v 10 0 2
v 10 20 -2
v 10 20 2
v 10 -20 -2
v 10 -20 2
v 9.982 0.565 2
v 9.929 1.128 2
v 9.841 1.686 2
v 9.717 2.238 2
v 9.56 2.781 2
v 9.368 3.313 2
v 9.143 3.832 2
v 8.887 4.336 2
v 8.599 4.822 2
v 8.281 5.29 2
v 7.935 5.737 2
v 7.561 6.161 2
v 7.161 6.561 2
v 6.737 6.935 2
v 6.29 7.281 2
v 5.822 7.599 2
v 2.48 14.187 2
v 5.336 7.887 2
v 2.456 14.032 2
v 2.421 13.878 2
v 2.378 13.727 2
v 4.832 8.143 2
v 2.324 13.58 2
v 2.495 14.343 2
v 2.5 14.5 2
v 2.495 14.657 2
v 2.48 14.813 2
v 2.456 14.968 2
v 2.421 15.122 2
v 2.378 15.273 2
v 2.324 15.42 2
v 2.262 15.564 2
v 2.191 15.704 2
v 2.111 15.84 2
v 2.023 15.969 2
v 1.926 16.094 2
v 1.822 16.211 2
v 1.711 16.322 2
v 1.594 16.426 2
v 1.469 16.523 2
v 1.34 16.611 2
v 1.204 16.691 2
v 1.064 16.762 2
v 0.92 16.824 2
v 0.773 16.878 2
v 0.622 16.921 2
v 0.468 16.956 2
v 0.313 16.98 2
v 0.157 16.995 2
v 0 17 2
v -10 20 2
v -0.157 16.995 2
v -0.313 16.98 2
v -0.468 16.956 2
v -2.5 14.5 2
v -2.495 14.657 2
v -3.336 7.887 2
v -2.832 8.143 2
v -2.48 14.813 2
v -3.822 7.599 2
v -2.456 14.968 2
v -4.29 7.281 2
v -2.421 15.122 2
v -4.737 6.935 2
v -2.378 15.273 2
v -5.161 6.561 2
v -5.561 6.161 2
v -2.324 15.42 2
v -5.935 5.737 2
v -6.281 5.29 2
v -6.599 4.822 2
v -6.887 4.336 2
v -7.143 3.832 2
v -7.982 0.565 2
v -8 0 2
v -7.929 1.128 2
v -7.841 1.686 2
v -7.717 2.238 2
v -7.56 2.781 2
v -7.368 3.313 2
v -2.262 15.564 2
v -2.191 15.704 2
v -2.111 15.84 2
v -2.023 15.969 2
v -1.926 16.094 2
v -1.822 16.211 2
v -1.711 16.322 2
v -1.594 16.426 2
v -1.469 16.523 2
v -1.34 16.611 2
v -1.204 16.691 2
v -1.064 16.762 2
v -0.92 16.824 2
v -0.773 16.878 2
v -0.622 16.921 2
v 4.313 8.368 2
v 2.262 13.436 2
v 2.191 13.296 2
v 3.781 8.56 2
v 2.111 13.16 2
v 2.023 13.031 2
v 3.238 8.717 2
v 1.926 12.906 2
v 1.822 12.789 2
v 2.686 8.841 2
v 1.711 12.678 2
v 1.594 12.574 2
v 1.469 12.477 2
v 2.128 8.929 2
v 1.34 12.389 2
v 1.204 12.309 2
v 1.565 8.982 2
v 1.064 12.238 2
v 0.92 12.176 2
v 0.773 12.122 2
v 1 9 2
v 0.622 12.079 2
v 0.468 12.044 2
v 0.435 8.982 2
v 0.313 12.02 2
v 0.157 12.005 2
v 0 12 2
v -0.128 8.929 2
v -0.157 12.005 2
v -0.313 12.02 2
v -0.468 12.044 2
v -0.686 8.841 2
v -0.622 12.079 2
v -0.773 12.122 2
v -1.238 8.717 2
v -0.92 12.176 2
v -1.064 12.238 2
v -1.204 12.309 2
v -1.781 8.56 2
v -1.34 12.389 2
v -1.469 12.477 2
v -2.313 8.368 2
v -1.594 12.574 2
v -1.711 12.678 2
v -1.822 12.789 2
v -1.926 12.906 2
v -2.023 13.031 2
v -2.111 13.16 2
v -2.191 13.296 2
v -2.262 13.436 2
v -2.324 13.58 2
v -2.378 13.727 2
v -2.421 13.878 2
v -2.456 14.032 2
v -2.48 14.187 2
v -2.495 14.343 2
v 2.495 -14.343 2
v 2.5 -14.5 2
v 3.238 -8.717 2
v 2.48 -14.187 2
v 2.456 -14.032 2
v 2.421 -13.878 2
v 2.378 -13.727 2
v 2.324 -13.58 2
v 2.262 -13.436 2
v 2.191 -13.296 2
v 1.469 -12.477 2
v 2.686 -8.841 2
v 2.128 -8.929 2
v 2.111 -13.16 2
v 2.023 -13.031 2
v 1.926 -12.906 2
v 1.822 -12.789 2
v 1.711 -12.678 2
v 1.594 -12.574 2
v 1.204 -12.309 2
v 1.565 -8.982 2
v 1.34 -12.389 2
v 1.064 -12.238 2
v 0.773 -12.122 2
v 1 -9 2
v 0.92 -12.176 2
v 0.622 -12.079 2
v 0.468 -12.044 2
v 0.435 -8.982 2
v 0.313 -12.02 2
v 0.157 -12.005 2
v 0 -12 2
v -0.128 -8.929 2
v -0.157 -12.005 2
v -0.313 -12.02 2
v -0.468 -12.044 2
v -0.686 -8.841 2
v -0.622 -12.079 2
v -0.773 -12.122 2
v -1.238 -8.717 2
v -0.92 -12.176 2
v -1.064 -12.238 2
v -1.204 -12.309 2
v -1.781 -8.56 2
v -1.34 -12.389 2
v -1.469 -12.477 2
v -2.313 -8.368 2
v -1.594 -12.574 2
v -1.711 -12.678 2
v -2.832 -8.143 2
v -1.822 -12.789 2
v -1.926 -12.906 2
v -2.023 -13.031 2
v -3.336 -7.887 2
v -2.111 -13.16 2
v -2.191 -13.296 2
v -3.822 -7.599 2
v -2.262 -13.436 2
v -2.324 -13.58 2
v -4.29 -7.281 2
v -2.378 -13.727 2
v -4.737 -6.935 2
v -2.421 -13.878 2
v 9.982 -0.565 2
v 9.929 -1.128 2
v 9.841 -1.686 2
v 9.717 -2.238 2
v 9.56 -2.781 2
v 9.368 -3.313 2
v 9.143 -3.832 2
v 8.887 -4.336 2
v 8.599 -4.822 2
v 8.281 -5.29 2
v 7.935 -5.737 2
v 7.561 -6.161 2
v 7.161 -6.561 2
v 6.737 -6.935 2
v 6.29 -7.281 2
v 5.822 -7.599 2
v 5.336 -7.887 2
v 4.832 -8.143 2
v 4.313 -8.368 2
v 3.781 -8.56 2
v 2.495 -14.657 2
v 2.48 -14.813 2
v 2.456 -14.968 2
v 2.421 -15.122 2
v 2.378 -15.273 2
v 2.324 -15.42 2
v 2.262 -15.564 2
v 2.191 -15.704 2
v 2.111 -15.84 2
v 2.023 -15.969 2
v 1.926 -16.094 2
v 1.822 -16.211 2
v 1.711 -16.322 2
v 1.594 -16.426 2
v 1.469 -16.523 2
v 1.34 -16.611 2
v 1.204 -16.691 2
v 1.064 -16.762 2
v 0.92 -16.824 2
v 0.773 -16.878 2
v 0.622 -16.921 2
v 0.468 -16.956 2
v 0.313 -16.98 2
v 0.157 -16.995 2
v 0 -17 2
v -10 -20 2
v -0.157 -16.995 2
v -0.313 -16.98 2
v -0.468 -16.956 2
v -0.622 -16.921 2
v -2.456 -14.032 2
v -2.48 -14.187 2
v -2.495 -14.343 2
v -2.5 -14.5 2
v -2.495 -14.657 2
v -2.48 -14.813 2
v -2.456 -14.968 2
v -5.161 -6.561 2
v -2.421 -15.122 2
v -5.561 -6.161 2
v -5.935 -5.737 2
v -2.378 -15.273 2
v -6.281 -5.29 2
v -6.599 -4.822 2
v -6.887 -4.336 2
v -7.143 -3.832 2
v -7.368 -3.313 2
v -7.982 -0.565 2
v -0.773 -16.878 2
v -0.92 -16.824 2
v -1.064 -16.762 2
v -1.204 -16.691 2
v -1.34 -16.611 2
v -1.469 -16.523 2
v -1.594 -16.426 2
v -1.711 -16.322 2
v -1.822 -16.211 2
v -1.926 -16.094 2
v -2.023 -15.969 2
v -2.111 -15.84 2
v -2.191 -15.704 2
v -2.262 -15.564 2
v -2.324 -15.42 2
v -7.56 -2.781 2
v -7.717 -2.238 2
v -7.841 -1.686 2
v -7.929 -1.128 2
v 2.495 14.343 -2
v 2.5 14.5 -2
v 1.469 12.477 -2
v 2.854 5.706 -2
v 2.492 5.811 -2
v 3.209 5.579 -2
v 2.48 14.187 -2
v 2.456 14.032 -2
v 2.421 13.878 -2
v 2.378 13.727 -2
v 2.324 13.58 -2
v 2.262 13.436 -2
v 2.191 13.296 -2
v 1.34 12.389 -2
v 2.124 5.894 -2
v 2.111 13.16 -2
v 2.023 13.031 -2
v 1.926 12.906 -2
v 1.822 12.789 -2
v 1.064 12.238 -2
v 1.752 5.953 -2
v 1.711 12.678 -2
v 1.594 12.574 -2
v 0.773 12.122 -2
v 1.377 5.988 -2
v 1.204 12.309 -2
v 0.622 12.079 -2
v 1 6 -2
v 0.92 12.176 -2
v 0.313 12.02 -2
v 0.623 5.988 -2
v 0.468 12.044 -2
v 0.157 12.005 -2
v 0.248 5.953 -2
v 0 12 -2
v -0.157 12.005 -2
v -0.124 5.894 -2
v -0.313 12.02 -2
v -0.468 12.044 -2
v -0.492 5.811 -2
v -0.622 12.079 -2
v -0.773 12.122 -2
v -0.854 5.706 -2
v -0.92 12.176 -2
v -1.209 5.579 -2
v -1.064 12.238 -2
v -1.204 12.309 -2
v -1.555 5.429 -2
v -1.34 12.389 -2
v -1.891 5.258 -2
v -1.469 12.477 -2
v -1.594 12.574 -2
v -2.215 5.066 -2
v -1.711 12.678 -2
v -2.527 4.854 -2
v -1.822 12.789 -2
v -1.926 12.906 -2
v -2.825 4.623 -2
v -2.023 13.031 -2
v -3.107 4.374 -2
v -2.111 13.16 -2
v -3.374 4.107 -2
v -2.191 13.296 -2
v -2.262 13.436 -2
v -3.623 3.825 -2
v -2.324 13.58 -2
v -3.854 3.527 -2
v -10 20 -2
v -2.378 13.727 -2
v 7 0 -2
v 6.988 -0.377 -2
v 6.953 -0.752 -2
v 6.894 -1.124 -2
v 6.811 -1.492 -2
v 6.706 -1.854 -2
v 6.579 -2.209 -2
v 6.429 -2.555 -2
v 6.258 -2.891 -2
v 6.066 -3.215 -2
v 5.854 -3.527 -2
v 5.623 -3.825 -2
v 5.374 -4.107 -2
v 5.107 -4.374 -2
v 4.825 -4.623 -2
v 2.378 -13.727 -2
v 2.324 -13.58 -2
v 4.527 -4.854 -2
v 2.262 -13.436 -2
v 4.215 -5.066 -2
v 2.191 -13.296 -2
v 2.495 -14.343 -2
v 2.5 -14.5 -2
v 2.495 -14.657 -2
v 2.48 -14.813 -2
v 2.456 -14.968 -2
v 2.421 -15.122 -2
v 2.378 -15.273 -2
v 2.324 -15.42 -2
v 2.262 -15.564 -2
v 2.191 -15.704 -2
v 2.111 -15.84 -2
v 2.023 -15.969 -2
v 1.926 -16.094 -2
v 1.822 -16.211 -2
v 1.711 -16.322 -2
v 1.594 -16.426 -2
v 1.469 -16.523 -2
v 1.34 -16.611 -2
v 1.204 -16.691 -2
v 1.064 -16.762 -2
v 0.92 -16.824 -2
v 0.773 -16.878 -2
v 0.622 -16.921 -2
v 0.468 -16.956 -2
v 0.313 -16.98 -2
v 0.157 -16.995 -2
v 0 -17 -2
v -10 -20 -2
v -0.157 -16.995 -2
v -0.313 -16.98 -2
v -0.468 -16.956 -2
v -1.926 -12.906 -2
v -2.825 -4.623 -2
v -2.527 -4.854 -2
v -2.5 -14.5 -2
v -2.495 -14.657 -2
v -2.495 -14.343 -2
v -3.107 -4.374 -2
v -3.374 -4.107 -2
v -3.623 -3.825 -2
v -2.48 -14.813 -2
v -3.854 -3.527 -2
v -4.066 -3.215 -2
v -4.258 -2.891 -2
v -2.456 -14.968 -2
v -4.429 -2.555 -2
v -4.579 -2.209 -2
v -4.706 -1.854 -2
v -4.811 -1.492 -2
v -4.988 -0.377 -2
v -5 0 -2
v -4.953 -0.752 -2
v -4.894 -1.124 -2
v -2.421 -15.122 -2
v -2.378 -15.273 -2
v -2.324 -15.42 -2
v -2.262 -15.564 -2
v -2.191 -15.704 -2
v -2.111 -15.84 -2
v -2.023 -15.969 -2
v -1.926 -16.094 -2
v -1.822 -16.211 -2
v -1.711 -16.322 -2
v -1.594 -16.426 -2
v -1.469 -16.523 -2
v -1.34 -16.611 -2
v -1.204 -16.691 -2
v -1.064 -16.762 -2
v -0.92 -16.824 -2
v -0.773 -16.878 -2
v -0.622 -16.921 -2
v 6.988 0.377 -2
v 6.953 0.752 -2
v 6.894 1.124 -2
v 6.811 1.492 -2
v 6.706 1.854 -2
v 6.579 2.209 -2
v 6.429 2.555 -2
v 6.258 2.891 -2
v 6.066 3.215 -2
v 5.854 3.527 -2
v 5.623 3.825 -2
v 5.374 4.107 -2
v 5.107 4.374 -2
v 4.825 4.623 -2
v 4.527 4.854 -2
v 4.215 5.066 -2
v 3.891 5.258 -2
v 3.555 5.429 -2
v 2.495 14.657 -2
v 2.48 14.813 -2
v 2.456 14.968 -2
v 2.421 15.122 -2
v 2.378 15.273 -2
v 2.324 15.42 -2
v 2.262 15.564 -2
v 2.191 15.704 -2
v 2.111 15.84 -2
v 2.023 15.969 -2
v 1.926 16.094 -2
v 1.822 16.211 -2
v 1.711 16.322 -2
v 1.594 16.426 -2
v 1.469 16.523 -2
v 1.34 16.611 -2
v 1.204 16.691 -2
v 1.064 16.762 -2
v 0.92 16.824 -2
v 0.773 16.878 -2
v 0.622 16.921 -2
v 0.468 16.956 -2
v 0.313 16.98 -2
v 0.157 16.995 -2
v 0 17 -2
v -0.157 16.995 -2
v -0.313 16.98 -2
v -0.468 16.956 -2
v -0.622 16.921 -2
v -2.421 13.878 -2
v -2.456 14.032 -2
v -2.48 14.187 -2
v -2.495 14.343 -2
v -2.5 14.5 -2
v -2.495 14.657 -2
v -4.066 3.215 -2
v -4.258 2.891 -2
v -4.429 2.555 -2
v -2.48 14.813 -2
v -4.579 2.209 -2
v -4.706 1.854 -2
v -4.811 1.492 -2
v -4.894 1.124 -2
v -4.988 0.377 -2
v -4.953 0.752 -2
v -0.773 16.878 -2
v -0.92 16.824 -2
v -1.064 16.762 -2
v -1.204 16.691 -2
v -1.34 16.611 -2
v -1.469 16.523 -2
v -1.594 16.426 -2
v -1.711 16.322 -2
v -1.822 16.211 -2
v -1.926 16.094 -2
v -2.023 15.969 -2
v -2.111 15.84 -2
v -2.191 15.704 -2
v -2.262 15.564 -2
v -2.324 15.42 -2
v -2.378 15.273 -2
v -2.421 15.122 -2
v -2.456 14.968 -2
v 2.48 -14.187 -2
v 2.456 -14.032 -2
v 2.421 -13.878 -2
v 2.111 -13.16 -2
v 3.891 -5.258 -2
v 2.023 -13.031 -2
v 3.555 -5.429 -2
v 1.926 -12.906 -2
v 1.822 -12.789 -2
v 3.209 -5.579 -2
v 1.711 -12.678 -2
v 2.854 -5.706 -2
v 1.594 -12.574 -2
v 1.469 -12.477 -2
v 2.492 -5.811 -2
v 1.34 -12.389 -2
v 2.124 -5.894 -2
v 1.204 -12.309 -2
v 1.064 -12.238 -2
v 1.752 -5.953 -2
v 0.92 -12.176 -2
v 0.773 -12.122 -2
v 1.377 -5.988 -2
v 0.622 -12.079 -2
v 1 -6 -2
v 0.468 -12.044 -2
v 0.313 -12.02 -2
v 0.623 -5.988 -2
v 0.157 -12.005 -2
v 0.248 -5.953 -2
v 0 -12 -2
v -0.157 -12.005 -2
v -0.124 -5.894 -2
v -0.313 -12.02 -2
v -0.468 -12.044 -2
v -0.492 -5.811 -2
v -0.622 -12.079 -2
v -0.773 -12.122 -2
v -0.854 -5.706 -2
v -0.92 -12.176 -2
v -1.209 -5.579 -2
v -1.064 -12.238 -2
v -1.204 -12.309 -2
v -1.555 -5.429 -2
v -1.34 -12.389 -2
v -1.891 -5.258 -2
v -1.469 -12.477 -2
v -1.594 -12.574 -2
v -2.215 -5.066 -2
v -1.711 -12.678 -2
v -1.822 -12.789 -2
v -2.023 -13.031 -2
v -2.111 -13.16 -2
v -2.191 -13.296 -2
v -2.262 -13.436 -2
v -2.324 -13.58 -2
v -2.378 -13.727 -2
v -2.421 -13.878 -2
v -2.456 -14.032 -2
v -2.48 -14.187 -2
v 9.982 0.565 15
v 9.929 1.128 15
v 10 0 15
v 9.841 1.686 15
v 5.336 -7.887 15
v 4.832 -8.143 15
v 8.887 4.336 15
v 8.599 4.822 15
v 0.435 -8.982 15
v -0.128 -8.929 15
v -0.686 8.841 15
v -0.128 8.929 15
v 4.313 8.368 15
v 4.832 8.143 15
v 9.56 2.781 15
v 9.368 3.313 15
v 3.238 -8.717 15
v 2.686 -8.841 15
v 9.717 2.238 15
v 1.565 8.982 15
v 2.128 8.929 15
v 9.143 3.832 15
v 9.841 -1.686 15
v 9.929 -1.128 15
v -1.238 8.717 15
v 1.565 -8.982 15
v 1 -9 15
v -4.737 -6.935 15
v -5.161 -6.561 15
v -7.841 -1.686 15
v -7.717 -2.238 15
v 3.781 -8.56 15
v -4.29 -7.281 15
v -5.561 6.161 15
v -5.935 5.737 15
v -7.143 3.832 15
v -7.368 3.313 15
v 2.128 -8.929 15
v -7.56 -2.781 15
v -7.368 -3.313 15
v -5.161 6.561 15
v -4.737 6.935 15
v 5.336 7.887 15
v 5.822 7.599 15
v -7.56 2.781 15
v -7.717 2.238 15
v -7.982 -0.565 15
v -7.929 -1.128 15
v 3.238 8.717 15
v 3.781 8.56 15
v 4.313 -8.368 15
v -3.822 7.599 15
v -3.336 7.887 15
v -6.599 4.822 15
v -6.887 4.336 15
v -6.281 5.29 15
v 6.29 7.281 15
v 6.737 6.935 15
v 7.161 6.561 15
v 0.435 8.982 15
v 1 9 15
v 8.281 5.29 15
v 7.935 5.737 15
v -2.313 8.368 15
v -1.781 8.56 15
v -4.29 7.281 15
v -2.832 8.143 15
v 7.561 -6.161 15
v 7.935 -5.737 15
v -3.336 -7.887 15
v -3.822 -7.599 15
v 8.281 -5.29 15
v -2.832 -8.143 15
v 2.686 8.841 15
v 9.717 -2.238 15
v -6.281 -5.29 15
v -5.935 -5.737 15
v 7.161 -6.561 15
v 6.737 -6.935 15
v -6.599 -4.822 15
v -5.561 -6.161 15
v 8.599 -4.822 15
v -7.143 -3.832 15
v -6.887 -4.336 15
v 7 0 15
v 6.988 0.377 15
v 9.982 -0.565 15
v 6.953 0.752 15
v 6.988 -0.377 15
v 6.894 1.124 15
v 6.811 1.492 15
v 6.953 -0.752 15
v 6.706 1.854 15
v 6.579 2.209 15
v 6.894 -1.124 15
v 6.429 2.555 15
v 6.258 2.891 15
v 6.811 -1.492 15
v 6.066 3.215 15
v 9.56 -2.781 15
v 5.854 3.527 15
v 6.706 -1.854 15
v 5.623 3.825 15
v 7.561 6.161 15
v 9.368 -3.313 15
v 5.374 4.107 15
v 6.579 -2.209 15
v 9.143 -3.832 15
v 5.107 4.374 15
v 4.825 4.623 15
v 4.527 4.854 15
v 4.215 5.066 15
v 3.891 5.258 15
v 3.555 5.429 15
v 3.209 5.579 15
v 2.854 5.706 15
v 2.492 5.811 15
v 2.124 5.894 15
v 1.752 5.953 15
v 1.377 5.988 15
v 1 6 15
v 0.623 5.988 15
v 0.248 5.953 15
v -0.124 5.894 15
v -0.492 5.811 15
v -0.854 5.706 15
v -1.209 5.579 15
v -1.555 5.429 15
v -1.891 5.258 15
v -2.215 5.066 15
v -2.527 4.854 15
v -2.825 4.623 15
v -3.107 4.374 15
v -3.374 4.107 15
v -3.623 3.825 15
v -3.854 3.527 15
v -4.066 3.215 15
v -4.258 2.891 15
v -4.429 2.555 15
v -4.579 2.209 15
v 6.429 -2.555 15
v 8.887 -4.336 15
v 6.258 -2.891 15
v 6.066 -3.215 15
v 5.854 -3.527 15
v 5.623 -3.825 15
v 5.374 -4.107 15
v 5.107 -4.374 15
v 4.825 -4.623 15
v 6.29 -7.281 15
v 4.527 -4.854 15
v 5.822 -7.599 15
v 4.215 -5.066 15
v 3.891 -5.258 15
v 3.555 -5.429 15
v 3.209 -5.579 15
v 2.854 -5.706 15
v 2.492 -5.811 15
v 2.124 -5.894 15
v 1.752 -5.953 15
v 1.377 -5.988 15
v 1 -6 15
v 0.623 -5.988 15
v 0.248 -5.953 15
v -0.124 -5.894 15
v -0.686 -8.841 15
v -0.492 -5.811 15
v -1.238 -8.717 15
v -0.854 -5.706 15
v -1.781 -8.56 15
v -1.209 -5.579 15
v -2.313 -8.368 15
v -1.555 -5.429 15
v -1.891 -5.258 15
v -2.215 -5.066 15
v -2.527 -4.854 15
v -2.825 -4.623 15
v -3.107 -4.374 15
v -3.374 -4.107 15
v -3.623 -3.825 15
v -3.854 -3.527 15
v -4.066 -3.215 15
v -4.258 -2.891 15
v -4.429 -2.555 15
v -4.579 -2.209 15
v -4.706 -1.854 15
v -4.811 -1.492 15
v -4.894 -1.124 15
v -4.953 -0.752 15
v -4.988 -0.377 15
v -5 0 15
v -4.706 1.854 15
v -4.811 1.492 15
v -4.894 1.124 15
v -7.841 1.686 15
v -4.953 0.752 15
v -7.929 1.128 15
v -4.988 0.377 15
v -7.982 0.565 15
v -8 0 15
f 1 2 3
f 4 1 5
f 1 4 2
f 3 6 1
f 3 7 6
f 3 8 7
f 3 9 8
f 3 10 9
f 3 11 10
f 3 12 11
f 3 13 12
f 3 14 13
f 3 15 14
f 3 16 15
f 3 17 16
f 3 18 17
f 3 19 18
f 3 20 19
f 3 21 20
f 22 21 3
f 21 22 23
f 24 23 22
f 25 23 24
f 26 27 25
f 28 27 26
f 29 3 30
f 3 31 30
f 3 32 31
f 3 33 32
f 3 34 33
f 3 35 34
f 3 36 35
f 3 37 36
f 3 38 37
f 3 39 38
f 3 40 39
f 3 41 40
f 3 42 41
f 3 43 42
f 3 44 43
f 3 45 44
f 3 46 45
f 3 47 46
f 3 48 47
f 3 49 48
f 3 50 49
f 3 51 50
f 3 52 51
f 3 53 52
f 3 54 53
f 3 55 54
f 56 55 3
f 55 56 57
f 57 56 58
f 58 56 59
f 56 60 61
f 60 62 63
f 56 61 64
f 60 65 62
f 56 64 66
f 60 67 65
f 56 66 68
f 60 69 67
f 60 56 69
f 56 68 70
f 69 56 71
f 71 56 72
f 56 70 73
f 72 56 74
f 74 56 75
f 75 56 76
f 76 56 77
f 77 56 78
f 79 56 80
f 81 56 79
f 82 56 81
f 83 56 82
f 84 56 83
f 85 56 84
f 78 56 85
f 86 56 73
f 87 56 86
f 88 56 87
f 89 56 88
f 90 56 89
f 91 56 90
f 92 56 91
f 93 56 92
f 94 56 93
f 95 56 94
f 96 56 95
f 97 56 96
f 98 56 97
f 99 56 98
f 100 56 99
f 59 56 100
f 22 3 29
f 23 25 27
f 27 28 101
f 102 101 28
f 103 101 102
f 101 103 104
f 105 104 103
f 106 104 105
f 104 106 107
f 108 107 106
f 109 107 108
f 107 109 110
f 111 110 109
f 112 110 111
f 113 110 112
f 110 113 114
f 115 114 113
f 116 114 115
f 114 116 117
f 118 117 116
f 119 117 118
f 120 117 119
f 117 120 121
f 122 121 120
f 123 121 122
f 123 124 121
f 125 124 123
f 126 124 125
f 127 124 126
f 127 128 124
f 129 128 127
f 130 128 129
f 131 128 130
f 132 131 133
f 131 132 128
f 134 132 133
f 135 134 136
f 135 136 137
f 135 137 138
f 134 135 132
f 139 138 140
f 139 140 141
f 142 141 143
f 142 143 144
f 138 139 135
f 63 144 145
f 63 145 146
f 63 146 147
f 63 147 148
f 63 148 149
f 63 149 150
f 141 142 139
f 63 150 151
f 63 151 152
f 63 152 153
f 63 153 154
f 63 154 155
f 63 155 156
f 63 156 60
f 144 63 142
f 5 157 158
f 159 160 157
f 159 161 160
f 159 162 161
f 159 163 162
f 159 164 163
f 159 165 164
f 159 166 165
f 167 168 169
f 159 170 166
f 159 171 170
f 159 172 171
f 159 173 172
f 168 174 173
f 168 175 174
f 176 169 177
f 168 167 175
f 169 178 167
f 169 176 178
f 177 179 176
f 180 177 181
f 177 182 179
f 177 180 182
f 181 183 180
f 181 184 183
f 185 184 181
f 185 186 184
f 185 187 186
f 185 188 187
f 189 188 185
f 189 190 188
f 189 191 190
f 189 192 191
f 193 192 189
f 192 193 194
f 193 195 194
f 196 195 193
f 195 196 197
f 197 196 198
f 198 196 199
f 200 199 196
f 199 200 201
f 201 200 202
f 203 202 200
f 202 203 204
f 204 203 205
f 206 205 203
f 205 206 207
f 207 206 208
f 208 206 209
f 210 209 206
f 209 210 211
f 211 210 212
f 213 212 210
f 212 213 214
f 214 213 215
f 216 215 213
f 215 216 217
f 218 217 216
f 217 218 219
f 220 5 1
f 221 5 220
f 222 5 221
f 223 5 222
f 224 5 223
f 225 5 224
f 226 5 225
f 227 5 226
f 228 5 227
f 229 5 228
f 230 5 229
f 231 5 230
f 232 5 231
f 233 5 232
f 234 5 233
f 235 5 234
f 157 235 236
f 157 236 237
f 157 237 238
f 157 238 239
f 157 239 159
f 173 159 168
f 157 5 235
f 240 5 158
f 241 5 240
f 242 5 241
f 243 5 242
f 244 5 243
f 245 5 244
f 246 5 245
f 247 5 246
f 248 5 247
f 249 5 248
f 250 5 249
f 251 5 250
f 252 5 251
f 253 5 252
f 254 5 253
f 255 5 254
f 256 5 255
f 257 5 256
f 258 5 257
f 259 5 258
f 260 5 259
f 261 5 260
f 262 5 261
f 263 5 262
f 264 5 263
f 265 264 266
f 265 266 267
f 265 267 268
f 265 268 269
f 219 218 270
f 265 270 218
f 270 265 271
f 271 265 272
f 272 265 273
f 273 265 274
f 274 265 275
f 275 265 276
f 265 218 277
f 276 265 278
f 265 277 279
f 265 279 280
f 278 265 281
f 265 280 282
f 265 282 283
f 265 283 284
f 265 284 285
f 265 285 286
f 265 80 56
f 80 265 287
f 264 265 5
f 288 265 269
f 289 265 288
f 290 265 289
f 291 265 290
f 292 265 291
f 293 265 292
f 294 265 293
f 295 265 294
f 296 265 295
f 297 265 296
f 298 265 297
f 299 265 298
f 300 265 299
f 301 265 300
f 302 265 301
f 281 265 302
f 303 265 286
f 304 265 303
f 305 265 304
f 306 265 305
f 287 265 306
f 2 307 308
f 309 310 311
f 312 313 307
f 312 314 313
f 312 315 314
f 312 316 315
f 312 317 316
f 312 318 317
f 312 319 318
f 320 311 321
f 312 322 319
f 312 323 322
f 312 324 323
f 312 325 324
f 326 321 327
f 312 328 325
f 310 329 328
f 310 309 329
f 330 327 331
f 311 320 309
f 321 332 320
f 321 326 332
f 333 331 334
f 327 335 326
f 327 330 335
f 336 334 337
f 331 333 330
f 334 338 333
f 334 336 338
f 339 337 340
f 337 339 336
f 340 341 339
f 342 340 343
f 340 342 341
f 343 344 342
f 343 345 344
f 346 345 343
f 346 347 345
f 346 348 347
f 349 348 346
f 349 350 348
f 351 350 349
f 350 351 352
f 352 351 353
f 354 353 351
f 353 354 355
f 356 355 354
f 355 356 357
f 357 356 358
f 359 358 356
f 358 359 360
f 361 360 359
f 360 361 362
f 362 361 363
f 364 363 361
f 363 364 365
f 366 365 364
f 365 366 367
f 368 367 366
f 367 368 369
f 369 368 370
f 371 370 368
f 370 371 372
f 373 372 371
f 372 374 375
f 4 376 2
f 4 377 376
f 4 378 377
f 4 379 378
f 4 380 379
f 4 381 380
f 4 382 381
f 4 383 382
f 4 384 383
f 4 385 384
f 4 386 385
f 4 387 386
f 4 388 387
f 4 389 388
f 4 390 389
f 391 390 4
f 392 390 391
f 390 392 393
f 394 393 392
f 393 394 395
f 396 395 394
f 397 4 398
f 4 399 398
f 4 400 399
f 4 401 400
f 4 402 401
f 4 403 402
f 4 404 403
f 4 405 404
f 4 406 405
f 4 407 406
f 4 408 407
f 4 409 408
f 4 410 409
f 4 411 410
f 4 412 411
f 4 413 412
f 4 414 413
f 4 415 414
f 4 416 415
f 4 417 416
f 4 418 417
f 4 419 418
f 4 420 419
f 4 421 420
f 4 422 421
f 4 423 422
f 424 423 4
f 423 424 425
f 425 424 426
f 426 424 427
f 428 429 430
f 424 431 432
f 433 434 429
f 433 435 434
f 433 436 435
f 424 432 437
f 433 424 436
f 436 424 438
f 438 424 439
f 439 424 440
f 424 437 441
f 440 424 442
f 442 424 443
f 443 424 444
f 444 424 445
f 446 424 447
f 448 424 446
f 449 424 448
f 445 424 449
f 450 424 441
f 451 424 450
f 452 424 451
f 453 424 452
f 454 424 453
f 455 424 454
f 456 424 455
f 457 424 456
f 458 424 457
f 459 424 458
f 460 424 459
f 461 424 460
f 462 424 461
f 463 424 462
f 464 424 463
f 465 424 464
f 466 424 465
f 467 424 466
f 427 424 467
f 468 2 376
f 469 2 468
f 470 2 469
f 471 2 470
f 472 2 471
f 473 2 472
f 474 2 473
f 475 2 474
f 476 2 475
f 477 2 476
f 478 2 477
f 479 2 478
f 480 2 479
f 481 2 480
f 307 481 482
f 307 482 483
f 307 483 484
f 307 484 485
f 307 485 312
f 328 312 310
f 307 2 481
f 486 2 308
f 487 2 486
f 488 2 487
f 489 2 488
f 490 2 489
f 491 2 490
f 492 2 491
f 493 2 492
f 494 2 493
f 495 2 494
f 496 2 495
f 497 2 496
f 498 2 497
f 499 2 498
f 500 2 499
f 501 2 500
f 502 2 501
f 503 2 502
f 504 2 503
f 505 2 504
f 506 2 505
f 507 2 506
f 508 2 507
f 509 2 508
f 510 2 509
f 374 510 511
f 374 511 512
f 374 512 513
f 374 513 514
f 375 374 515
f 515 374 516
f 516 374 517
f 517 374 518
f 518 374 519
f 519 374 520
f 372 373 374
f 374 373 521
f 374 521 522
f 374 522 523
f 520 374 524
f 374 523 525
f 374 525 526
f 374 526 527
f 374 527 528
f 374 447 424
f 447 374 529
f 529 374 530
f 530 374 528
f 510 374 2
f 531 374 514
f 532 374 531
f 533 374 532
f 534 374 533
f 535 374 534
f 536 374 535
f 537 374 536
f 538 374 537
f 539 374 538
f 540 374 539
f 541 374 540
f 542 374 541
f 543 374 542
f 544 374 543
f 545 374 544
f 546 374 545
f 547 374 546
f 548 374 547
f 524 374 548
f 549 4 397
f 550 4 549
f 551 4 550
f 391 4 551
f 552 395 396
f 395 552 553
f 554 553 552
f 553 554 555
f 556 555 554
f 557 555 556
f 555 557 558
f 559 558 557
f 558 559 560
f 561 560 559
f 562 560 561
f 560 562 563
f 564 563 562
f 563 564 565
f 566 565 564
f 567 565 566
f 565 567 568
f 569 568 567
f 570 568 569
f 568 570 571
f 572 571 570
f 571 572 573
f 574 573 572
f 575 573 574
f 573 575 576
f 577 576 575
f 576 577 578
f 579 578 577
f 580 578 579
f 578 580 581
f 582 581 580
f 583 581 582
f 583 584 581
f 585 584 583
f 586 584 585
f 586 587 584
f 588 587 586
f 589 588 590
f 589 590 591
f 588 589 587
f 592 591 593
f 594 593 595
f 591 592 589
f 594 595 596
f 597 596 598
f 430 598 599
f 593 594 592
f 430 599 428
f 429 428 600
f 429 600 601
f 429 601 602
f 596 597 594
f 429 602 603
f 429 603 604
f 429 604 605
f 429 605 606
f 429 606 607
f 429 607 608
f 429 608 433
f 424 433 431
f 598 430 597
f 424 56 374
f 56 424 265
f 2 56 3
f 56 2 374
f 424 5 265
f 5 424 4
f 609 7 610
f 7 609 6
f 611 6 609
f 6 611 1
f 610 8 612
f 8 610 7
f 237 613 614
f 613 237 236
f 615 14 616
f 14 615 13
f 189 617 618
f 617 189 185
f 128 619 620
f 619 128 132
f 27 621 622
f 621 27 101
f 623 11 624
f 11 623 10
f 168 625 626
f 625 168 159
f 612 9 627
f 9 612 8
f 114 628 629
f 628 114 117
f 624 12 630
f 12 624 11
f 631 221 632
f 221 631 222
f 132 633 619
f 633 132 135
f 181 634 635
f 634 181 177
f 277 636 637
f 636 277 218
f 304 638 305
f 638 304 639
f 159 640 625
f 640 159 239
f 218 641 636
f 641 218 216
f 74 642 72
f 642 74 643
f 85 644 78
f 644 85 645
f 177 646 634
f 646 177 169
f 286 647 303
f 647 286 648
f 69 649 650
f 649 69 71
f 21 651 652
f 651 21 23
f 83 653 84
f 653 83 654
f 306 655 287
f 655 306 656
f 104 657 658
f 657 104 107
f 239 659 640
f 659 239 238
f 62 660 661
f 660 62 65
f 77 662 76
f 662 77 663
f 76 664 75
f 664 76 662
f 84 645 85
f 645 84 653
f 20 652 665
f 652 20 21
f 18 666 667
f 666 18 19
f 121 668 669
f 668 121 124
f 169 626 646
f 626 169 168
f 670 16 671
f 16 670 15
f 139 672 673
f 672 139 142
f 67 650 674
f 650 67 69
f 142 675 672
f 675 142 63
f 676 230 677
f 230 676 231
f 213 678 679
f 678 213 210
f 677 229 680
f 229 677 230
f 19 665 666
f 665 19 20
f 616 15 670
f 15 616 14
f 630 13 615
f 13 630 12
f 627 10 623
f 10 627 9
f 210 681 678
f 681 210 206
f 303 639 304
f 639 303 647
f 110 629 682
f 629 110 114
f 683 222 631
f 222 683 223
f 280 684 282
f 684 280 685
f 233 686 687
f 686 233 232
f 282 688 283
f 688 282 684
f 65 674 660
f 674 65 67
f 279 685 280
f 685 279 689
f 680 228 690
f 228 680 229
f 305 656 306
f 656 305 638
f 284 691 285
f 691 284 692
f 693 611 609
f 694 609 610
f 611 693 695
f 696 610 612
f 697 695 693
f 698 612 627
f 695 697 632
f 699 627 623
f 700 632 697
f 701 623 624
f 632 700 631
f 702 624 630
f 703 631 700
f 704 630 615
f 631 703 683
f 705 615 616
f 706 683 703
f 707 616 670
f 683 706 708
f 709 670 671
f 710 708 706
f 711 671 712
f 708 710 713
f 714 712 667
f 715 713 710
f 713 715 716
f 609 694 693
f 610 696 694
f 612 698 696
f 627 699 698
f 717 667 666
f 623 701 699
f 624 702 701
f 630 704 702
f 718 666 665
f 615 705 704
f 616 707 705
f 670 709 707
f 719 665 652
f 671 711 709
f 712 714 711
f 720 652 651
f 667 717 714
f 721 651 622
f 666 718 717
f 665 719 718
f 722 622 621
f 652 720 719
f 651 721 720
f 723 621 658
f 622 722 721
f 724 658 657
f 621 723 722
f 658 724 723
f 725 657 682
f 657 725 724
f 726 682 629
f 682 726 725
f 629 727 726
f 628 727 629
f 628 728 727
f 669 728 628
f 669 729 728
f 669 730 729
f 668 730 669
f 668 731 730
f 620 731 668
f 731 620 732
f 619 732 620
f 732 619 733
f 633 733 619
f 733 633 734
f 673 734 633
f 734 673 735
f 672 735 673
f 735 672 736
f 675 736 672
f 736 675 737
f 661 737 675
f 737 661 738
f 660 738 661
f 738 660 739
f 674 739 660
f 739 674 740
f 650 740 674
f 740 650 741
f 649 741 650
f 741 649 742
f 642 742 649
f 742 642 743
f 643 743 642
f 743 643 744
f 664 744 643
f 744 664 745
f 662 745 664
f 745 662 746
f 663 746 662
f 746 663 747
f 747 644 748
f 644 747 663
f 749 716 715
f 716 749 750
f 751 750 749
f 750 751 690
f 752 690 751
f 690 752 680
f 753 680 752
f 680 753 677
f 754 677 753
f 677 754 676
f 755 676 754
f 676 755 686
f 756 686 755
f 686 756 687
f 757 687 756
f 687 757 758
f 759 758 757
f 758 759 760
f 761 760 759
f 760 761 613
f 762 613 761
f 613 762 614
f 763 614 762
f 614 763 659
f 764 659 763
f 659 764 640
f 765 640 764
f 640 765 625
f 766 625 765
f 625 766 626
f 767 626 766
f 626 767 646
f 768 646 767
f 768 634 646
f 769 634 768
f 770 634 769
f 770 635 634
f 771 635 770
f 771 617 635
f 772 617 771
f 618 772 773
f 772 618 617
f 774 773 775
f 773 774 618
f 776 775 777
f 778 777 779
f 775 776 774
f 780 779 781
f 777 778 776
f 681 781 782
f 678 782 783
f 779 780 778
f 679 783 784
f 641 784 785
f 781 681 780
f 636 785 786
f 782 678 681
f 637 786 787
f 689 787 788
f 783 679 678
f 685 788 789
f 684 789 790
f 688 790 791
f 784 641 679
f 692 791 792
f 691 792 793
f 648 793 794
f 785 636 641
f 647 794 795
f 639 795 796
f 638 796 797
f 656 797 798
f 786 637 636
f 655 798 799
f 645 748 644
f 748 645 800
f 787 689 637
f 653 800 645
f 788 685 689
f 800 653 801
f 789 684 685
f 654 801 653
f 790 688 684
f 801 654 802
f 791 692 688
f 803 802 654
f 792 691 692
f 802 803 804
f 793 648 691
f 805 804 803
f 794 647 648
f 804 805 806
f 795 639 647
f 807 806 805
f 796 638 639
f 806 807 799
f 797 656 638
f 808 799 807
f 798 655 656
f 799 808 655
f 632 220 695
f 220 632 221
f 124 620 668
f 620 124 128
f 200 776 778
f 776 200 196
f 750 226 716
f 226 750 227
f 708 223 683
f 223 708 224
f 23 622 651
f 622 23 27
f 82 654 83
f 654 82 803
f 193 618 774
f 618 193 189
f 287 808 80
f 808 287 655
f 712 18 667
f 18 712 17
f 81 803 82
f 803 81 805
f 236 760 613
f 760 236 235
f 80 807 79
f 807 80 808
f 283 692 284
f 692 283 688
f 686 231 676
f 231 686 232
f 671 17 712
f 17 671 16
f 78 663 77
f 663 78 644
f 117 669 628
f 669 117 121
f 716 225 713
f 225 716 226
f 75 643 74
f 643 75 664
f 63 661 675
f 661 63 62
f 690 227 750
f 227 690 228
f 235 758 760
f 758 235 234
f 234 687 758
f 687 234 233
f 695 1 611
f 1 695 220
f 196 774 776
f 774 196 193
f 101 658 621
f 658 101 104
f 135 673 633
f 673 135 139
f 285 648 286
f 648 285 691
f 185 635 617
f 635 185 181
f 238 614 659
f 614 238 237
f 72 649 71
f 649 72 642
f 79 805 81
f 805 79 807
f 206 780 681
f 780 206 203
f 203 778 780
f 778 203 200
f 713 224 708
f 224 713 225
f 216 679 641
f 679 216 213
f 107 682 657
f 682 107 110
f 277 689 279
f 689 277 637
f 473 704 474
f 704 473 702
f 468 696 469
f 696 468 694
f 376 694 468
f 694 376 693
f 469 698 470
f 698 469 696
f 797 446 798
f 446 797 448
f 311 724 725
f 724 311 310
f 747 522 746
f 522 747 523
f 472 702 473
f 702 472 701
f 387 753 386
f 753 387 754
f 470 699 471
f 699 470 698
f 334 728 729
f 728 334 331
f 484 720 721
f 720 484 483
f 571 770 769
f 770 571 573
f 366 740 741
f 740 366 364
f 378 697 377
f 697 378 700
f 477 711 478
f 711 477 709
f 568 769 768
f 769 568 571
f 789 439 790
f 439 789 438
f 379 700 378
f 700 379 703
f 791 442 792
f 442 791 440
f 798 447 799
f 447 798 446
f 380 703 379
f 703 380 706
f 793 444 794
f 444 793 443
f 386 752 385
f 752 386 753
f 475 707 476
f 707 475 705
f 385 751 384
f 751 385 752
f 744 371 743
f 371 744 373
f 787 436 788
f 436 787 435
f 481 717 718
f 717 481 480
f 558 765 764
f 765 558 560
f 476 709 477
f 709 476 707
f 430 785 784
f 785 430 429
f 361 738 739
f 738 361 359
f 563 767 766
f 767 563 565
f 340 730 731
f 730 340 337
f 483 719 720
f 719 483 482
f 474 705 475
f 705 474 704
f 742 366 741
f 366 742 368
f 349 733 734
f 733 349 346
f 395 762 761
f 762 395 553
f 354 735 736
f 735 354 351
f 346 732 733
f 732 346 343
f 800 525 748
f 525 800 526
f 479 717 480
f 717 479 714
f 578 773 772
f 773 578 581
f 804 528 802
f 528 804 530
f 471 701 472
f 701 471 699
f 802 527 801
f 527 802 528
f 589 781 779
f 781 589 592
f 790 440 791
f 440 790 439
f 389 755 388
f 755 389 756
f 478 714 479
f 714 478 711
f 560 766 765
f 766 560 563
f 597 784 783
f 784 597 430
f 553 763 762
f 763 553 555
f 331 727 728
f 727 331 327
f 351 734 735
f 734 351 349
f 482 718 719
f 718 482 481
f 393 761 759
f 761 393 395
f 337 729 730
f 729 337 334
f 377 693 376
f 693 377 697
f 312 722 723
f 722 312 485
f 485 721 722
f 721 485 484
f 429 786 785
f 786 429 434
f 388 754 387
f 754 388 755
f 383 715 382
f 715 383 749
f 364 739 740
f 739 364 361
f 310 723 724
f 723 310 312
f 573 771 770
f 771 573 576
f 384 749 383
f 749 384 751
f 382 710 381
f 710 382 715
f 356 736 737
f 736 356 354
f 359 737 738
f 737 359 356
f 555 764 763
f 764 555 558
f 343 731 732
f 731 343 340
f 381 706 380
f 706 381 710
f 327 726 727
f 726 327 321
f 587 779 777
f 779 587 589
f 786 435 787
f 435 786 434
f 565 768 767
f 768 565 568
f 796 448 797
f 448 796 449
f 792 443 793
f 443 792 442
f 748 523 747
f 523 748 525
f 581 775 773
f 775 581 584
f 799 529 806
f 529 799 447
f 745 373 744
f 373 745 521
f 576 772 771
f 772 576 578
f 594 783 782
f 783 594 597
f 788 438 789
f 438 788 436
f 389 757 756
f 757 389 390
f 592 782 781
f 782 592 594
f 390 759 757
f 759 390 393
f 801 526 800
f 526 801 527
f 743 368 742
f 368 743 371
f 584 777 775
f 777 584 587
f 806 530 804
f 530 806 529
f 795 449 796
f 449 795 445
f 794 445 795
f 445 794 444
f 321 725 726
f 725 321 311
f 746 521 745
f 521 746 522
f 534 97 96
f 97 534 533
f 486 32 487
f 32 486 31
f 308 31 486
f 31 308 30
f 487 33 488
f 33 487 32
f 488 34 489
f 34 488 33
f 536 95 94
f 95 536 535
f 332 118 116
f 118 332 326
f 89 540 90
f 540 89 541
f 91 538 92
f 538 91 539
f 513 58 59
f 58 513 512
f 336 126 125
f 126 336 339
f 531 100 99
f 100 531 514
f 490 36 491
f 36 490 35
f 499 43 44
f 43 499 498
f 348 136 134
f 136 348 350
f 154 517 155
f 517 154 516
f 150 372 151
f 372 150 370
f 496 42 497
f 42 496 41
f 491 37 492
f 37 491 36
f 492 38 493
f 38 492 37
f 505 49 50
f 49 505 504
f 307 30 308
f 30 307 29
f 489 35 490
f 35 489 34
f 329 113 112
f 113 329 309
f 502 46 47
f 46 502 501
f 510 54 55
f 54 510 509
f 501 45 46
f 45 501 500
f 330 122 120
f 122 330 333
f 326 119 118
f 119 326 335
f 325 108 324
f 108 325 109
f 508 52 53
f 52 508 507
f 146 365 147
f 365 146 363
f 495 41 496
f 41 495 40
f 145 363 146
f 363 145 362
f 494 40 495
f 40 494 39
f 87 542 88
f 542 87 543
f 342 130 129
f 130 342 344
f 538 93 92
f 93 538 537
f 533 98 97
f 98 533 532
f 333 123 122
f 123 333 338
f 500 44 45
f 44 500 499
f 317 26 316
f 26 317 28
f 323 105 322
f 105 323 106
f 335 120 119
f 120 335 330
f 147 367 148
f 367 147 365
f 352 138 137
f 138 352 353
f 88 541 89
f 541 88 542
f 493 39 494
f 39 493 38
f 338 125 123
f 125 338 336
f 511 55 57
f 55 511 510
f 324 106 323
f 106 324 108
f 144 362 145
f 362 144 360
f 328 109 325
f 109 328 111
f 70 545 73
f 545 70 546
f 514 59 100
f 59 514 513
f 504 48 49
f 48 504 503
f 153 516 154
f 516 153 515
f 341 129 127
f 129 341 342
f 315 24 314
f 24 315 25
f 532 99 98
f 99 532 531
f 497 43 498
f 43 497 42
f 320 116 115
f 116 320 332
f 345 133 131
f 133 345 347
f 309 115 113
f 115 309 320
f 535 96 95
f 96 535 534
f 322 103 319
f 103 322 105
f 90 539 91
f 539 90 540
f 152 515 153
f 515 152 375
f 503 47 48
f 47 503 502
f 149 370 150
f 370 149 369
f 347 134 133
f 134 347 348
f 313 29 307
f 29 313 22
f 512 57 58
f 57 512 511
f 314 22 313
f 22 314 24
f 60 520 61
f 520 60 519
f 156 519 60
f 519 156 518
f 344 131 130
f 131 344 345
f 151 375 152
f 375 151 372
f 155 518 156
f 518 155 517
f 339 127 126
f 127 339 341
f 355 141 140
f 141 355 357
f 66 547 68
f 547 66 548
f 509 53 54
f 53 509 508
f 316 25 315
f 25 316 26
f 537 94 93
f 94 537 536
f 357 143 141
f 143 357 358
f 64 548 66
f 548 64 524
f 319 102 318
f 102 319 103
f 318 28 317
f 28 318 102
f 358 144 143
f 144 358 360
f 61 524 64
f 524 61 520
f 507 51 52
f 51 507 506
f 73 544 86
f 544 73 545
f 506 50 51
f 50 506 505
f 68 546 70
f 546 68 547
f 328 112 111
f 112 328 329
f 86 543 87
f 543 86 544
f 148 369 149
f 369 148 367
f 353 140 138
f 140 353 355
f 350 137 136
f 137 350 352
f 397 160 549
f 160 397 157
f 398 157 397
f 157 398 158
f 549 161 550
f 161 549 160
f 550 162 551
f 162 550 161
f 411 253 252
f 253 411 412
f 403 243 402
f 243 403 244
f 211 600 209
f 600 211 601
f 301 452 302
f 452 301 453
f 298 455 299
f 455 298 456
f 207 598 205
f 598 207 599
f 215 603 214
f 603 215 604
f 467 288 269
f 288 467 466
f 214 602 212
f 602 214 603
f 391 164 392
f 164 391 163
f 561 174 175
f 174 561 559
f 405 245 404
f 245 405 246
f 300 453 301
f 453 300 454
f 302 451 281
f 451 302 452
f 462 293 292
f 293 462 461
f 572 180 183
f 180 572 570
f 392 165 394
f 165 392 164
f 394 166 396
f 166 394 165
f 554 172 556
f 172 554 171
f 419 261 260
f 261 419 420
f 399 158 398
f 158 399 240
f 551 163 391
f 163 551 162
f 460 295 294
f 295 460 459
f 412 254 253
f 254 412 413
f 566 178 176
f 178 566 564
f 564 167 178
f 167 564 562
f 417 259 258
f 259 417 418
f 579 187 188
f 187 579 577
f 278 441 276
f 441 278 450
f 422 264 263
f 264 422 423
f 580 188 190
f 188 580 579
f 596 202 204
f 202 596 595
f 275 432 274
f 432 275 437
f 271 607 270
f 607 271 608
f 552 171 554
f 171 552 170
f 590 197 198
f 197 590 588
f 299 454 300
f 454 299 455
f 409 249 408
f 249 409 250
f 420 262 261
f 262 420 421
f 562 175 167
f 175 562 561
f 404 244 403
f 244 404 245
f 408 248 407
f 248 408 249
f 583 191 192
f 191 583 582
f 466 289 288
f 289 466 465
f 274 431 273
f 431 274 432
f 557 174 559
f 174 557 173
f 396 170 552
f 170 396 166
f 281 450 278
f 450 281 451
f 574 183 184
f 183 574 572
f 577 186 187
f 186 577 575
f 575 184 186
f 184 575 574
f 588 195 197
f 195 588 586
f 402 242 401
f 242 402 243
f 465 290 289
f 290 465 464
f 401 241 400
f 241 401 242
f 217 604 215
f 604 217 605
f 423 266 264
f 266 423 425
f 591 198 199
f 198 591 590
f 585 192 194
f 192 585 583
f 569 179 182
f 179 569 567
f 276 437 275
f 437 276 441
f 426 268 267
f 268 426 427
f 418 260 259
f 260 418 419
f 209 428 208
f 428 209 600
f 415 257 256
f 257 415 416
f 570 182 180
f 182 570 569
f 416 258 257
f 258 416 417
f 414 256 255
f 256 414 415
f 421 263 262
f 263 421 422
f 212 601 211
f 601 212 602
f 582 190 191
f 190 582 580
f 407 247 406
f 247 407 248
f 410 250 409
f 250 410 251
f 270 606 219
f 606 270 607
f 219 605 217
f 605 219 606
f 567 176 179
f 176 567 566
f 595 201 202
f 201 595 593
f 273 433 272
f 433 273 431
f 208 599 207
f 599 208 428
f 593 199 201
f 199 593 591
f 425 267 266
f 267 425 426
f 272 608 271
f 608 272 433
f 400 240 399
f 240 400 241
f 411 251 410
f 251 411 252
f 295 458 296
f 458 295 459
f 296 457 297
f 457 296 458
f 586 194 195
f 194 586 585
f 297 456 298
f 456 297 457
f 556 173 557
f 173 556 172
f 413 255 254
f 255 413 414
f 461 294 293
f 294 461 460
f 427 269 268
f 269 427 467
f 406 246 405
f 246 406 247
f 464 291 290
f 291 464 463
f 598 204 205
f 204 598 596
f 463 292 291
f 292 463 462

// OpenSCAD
module rod_cap(color="purple") {
    $fn=100;
    color(color,1.0) difference() {
        union() {
            cube([20,40,4],true);
            translate([1,0,0]) cylinder(r=9,h=15);
        }
        translate([1,0,-3]) cylinder(r=6,h=19);
        translate([0,14.5,-11]) cylinder(r=2.5,h=25);
        translate([0,-14.5,-11]) cylinder(r=2.5,h=25);
    }
}

rod_cap();
